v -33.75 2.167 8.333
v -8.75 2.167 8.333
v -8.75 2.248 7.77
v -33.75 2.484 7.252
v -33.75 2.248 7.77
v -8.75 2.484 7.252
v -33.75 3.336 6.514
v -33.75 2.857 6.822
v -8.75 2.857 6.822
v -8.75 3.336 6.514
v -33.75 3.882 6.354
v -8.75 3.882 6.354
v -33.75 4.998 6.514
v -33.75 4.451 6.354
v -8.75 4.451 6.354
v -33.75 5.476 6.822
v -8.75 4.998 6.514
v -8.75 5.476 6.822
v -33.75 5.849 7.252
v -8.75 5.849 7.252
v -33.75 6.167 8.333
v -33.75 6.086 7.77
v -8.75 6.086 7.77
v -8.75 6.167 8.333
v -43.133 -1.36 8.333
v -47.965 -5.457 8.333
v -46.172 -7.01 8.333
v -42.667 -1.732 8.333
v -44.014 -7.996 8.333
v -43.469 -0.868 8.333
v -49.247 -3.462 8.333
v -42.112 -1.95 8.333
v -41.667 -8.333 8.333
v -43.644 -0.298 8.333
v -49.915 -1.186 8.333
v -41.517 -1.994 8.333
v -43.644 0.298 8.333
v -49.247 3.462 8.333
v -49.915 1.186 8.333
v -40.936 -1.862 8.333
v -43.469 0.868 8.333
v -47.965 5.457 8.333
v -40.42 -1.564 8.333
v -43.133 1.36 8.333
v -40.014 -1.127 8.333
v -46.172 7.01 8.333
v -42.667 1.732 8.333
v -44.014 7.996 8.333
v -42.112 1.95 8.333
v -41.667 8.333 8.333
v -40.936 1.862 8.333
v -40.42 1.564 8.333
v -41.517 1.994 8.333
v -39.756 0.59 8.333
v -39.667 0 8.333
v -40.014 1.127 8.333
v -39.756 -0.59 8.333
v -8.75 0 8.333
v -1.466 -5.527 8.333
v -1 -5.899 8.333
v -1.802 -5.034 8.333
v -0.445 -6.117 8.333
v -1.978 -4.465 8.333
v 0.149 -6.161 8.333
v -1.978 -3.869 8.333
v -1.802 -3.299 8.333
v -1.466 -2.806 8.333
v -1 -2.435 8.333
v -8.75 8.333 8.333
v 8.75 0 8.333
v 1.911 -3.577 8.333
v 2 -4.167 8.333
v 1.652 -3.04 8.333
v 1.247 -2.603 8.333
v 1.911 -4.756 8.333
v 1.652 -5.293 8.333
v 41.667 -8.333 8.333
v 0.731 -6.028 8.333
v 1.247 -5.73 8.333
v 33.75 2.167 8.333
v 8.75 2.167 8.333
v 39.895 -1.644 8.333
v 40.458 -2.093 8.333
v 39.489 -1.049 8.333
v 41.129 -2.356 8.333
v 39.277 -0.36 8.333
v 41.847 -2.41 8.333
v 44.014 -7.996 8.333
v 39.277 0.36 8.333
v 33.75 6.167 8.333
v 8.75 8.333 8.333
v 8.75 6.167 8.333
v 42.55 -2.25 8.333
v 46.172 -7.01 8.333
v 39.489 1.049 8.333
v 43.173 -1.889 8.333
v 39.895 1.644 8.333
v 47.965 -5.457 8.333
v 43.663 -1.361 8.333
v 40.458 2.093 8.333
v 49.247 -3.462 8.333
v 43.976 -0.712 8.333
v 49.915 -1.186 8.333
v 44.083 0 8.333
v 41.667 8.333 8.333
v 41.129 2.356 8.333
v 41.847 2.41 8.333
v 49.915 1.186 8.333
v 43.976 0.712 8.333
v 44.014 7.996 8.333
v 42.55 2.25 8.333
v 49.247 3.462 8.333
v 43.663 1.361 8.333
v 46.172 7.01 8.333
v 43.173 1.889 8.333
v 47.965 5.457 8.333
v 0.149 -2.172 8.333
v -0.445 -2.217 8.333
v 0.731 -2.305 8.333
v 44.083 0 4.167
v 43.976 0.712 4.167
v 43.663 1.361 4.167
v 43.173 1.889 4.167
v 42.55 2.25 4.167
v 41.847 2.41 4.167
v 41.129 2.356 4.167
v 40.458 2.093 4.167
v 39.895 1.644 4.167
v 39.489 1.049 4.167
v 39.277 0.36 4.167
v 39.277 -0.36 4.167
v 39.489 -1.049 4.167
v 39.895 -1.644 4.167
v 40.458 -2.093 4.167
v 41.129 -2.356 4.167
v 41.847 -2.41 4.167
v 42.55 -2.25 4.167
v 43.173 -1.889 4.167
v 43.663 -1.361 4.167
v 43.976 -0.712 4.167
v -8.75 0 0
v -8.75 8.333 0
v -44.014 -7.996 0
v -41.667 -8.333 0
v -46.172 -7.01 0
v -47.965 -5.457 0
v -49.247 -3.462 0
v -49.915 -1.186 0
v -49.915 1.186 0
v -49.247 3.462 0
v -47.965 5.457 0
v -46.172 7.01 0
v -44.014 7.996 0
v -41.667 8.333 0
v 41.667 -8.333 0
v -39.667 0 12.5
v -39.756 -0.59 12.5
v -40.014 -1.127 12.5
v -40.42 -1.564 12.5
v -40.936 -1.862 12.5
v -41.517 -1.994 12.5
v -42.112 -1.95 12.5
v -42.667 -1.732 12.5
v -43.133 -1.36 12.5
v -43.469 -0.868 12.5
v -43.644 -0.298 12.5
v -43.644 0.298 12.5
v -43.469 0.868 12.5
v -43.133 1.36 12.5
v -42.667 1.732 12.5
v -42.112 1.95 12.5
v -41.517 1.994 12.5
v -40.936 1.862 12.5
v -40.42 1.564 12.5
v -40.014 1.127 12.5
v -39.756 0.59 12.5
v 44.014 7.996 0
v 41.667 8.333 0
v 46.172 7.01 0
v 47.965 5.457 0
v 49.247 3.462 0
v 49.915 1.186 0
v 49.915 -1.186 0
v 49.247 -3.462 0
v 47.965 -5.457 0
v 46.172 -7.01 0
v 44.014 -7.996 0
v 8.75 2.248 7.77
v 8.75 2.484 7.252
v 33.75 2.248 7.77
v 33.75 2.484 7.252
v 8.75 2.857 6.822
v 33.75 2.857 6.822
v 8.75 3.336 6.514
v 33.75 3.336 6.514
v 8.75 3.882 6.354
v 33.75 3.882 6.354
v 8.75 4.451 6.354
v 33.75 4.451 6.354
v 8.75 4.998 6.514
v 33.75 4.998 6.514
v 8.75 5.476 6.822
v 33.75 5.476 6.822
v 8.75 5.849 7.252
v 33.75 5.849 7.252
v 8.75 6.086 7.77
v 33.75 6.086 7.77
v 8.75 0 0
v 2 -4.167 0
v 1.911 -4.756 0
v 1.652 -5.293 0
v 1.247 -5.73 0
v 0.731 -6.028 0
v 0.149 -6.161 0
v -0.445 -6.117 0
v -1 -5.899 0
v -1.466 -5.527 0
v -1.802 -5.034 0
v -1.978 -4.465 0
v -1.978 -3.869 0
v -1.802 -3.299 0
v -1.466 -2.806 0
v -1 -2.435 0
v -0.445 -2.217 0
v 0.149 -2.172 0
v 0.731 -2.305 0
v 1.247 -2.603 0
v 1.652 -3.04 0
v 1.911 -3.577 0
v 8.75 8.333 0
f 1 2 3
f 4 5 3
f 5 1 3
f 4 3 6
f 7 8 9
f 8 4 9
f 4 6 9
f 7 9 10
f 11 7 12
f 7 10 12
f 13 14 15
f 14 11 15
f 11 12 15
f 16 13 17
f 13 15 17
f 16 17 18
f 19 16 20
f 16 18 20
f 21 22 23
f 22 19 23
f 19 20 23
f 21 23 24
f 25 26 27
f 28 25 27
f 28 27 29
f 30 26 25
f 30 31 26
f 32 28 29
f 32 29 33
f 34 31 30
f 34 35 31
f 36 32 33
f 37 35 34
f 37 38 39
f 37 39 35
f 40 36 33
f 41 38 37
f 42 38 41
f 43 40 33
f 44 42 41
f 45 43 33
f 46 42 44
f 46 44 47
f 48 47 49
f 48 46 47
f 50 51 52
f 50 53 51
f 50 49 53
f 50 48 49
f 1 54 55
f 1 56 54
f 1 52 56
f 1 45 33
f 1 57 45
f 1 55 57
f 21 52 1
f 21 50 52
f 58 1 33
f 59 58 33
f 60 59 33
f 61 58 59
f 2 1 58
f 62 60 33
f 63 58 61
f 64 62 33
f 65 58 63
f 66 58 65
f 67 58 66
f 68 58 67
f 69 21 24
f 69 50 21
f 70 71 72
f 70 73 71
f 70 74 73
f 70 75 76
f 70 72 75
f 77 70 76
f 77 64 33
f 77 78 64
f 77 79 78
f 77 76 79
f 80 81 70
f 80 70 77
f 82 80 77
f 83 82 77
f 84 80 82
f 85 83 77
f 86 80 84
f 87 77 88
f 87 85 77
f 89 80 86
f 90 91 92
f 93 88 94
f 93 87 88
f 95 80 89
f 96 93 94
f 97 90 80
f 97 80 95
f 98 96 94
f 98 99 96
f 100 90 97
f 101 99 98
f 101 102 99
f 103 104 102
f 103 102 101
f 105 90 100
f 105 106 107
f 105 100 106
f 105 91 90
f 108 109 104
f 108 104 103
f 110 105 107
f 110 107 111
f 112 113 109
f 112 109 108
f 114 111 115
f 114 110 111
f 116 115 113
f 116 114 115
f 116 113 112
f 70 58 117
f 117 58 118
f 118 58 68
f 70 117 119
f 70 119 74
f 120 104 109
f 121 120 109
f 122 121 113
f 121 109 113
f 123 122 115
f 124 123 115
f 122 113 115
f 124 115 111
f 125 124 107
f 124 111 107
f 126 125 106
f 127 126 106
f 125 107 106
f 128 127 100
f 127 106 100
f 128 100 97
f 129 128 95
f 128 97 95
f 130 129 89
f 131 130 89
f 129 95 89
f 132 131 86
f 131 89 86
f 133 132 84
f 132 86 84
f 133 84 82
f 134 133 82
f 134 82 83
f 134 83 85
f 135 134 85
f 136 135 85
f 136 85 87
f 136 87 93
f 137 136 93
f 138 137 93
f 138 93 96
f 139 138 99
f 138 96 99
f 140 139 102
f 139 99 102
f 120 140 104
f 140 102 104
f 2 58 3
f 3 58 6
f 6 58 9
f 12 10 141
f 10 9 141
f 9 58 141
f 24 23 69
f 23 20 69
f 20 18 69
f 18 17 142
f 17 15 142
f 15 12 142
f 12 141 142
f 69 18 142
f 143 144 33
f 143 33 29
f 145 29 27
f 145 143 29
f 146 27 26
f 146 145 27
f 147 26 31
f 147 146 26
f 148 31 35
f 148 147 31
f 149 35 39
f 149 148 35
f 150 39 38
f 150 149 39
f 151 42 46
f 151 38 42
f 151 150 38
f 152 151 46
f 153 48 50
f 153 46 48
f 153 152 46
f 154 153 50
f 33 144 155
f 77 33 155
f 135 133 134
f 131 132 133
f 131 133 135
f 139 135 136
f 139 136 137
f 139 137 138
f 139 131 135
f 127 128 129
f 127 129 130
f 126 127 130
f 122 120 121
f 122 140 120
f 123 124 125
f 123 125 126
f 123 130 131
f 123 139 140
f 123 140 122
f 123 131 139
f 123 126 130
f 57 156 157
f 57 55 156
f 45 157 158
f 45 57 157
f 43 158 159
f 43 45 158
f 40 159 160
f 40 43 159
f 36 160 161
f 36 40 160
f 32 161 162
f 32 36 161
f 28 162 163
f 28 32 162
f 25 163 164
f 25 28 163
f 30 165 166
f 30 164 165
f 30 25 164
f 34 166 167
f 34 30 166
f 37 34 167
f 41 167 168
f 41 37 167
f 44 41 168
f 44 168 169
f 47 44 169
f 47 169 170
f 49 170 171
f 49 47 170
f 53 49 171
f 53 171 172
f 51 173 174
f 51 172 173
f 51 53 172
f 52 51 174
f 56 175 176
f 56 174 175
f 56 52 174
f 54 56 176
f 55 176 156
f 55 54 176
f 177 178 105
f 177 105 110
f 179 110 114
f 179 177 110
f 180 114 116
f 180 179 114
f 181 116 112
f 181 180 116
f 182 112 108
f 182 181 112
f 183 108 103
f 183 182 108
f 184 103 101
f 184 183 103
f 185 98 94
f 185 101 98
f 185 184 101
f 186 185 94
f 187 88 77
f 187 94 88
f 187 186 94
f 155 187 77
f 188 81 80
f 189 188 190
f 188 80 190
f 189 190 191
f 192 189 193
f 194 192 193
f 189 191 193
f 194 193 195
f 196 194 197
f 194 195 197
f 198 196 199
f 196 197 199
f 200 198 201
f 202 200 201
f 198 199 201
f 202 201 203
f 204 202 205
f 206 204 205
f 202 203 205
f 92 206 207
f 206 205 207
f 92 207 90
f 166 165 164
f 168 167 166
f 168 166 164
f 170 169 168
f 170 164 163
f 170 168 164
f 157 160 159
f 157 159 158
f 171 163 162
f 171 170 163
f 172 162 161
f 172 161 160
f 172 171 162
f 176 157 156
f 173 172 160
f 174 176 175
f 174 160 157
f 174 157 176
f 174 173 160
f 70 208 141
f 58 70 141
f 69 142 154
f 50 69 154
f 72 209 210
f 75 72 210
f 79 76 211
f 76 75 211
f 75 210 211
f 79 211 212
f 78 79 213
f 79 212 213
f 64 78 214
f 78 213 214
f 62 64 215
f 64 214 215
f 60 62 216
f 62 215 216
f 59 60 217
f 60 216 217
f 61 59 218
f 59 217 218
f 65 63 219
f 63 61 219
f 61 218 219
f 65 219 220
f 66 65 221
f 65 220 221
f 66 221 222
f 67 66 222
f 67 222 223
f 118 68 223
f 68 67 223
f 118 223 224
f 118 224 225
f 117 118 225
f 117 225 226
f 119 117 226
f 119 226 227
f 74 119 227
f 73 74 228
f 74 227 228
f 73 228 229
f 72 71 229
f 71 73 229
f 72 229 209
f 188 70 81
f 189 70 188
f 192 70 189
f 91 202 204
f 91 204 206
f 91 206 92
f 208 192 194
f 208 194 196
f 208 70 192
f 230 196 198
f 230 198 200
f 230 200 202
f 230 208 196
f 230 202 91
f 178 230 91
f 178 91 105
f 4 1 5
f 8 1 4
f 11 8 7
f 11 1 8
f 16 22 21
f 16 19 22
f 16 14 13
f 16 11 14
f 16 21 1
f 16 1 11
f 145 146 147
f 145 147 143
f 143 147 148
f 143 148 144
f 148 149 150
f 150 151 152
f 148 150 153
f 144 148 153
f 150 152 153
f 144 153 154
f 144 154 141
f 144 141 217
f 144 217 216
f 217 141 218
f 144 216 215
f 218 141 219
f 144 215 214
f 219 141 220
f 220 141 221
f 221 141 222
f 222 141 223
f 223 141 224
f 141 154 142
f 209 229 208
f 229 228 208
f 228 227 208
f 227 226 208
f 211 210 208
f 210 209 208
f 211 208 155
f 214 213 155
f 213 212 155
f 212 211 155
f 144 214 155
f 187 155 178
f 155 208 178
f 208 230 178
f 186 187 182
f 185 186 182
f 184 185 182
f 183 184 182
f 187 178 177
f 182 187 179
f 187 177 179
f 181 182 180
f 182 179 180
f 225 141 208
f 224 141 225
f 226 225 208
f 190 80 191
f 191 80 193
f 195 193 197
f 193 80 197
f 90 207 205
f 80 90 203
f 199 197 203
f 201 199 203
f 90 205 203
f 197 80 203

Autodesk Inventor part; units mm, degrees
ref_plane "YZ Plane" through (0, 0, 0) normal (1, 0, 0) x (0, 1, 0)
ref_plane "XZ Plane" through (0, 0, 0) normal (0, 1, 0) x (-1, 0, 0)
ref_plane "XY Plane" through (0, 0, 0) normal (0, 0, 1) x (1, 0, 0)
sketch "Sketch1" plane through (0, 0, 0) normal (0, 0, 1) x (1, 0, 0)
  line L0 (-41.6667, 0) -> (41.6667, 0) construction
  line L1 (-41.6667, -8.3333) -> (41.6667, -8.3333)
  arc A0 (-41.6667, 8.3333) -> (-41.6667, -8.3333) centre (-41.6667, 0) ccw
  arc A1 (41.6667, -8.3333) -> (41.6667, 8.3333) centre (41.6667, 0) ccw
  line L2 (-8.75, 8.3333) -> (-41.6667, 8.3333)
  circle A2 centre (0, -4.1667) radius 2
  line L3 (0, 0) -> (-8.75, 0)
  line L4 (-8.75, 0) -> (-8.75, 8.3333)
  line L5 (0, 0) -> (8.75, 0)
  line L6 (8.75, 0) -> (8.75, 8.3333)
  line L7 (8.75, 8.3333) -> (41.6667, 8.3333)
  dimension "HL" = 41.6667
  dimension "d1" = 16.6667
  dimension "d10" = 4.1667
  dimension "HD" = 4
  dimension "d12" = 41.6667
  dimension "d13" = 8.75
  dimension "d14" = 8.75
  dimension "d17" = 8.75
  dimension "d18" = 8.3333
extrude "Main" add sketch "Sketch1" along normal blind 8.3333
sketch "Sketch2" plane through (-8.75, 0, 0) normal (1, 0, 0) x (0, 0, -1)
  line L0 (-8.3333, 8.3333) -> (-8.3333, 0) projected
  circle A0 centre (-8.3333, 4.1667) radius 2
  point P0 (0, 0)
  dimension "d19" = 4
extrude "Hole" cut sketch "Sketch2" along normal blind 42.5 and the other way blind 25
sketch "Sketch3" plane through (0, 0, 8.3333) normal (0, 0, 1) x (1, 0, 0)
  circle A0 centre (-41.6667, 0) radius 2
  line L0 (41.6667, 8.3333) -> (8.75, 8.3333) projected
  line L1 (-8.75, 8.3333) -> (-41.6667, 8.3333) projected
  point P0 (0, 0)
  dimension "d24" = 4
  dimension "d25" = 41.6667
  dimension "d29" = 8.3333
sketch "Sketch4" plane through (0, 0, 8.3333) normal (0, 0, 1) x (1, 0, 0)
  circle A0 centre (41.6667, 0) radius 2.4167
  line L0 (41.6667, 8.3333) -> (8.75, 8.3333) projected
  point P0 (0, 0)
  dimension "d30" = 41.6667
  dimension "d31" = 4.8333
  dimension "d32" = 8.3333
extrude "Pigg" add sketch "Sketch3" along normal blind 4.1667
extrude "Minuspigg" cut sketch "Sketch4" against normal blind 4.1667
sketch "Sketch5" plane through (0, 0, 8.3333) normal (0, 0, 1) x (1, 0, 0)
  point P0 (0, 0)
sketch "Sketch6" plane through (0, 0, 8.3333) normal (0, 0, 1) x (1, 0, 0)
  point P0 (0, 0)
sketch "Sketch7" plane through (0, 0, 8.3333) normal (0, 0, 1) x (1, 0, 0)
  point P0 (0, 0)
sketch "Sketch8" plane through (0, 0, 8.3333) normal (0, 0, 1) x (1, 0, 0)
  point P0 (0, 0)
sketch "Sketch9" plane through (0, 0, 8.3333) normal (0, 0, 1) x (1, 0, 0)
  point P0 (0, 0)
equation "\"d1\" = 0.4 * HL"
equation "\"d10\" = 0.1 * HL"
equation "\"d12\" = HL"
equation "\"d13\" = 0.2 * HL + Eps"
equation "\"d14\" = 0.2 * HL + Eps"
equation "\"d17\" = 0.2 * HL + Eps"
equation "\"d18\" = 0.2 * HL"
equation "\"d15\" = 0.2 * HL"
equation "\"d19\" = HD"
equation "\"d20\" = HL + 2 * Eps"
equation "\"d21\" = 0.6 * HL"
equation "\"d24\" = HD"
equation "\"d25\" = HL"
equation "\"d29\" = 0.2 * HL"
equation "\"d30\" = HL"
equation "\"d31\" = HD + 2 * Eps"
equation "\"d32\" = 0.2 * HL"
equation "\"d33\" = 0.1 * HL"
equation "\"d35\" = 0.1 * HL"
equation "\"Eps\" = 0.41667"
properties part number "1fjärdedel"
